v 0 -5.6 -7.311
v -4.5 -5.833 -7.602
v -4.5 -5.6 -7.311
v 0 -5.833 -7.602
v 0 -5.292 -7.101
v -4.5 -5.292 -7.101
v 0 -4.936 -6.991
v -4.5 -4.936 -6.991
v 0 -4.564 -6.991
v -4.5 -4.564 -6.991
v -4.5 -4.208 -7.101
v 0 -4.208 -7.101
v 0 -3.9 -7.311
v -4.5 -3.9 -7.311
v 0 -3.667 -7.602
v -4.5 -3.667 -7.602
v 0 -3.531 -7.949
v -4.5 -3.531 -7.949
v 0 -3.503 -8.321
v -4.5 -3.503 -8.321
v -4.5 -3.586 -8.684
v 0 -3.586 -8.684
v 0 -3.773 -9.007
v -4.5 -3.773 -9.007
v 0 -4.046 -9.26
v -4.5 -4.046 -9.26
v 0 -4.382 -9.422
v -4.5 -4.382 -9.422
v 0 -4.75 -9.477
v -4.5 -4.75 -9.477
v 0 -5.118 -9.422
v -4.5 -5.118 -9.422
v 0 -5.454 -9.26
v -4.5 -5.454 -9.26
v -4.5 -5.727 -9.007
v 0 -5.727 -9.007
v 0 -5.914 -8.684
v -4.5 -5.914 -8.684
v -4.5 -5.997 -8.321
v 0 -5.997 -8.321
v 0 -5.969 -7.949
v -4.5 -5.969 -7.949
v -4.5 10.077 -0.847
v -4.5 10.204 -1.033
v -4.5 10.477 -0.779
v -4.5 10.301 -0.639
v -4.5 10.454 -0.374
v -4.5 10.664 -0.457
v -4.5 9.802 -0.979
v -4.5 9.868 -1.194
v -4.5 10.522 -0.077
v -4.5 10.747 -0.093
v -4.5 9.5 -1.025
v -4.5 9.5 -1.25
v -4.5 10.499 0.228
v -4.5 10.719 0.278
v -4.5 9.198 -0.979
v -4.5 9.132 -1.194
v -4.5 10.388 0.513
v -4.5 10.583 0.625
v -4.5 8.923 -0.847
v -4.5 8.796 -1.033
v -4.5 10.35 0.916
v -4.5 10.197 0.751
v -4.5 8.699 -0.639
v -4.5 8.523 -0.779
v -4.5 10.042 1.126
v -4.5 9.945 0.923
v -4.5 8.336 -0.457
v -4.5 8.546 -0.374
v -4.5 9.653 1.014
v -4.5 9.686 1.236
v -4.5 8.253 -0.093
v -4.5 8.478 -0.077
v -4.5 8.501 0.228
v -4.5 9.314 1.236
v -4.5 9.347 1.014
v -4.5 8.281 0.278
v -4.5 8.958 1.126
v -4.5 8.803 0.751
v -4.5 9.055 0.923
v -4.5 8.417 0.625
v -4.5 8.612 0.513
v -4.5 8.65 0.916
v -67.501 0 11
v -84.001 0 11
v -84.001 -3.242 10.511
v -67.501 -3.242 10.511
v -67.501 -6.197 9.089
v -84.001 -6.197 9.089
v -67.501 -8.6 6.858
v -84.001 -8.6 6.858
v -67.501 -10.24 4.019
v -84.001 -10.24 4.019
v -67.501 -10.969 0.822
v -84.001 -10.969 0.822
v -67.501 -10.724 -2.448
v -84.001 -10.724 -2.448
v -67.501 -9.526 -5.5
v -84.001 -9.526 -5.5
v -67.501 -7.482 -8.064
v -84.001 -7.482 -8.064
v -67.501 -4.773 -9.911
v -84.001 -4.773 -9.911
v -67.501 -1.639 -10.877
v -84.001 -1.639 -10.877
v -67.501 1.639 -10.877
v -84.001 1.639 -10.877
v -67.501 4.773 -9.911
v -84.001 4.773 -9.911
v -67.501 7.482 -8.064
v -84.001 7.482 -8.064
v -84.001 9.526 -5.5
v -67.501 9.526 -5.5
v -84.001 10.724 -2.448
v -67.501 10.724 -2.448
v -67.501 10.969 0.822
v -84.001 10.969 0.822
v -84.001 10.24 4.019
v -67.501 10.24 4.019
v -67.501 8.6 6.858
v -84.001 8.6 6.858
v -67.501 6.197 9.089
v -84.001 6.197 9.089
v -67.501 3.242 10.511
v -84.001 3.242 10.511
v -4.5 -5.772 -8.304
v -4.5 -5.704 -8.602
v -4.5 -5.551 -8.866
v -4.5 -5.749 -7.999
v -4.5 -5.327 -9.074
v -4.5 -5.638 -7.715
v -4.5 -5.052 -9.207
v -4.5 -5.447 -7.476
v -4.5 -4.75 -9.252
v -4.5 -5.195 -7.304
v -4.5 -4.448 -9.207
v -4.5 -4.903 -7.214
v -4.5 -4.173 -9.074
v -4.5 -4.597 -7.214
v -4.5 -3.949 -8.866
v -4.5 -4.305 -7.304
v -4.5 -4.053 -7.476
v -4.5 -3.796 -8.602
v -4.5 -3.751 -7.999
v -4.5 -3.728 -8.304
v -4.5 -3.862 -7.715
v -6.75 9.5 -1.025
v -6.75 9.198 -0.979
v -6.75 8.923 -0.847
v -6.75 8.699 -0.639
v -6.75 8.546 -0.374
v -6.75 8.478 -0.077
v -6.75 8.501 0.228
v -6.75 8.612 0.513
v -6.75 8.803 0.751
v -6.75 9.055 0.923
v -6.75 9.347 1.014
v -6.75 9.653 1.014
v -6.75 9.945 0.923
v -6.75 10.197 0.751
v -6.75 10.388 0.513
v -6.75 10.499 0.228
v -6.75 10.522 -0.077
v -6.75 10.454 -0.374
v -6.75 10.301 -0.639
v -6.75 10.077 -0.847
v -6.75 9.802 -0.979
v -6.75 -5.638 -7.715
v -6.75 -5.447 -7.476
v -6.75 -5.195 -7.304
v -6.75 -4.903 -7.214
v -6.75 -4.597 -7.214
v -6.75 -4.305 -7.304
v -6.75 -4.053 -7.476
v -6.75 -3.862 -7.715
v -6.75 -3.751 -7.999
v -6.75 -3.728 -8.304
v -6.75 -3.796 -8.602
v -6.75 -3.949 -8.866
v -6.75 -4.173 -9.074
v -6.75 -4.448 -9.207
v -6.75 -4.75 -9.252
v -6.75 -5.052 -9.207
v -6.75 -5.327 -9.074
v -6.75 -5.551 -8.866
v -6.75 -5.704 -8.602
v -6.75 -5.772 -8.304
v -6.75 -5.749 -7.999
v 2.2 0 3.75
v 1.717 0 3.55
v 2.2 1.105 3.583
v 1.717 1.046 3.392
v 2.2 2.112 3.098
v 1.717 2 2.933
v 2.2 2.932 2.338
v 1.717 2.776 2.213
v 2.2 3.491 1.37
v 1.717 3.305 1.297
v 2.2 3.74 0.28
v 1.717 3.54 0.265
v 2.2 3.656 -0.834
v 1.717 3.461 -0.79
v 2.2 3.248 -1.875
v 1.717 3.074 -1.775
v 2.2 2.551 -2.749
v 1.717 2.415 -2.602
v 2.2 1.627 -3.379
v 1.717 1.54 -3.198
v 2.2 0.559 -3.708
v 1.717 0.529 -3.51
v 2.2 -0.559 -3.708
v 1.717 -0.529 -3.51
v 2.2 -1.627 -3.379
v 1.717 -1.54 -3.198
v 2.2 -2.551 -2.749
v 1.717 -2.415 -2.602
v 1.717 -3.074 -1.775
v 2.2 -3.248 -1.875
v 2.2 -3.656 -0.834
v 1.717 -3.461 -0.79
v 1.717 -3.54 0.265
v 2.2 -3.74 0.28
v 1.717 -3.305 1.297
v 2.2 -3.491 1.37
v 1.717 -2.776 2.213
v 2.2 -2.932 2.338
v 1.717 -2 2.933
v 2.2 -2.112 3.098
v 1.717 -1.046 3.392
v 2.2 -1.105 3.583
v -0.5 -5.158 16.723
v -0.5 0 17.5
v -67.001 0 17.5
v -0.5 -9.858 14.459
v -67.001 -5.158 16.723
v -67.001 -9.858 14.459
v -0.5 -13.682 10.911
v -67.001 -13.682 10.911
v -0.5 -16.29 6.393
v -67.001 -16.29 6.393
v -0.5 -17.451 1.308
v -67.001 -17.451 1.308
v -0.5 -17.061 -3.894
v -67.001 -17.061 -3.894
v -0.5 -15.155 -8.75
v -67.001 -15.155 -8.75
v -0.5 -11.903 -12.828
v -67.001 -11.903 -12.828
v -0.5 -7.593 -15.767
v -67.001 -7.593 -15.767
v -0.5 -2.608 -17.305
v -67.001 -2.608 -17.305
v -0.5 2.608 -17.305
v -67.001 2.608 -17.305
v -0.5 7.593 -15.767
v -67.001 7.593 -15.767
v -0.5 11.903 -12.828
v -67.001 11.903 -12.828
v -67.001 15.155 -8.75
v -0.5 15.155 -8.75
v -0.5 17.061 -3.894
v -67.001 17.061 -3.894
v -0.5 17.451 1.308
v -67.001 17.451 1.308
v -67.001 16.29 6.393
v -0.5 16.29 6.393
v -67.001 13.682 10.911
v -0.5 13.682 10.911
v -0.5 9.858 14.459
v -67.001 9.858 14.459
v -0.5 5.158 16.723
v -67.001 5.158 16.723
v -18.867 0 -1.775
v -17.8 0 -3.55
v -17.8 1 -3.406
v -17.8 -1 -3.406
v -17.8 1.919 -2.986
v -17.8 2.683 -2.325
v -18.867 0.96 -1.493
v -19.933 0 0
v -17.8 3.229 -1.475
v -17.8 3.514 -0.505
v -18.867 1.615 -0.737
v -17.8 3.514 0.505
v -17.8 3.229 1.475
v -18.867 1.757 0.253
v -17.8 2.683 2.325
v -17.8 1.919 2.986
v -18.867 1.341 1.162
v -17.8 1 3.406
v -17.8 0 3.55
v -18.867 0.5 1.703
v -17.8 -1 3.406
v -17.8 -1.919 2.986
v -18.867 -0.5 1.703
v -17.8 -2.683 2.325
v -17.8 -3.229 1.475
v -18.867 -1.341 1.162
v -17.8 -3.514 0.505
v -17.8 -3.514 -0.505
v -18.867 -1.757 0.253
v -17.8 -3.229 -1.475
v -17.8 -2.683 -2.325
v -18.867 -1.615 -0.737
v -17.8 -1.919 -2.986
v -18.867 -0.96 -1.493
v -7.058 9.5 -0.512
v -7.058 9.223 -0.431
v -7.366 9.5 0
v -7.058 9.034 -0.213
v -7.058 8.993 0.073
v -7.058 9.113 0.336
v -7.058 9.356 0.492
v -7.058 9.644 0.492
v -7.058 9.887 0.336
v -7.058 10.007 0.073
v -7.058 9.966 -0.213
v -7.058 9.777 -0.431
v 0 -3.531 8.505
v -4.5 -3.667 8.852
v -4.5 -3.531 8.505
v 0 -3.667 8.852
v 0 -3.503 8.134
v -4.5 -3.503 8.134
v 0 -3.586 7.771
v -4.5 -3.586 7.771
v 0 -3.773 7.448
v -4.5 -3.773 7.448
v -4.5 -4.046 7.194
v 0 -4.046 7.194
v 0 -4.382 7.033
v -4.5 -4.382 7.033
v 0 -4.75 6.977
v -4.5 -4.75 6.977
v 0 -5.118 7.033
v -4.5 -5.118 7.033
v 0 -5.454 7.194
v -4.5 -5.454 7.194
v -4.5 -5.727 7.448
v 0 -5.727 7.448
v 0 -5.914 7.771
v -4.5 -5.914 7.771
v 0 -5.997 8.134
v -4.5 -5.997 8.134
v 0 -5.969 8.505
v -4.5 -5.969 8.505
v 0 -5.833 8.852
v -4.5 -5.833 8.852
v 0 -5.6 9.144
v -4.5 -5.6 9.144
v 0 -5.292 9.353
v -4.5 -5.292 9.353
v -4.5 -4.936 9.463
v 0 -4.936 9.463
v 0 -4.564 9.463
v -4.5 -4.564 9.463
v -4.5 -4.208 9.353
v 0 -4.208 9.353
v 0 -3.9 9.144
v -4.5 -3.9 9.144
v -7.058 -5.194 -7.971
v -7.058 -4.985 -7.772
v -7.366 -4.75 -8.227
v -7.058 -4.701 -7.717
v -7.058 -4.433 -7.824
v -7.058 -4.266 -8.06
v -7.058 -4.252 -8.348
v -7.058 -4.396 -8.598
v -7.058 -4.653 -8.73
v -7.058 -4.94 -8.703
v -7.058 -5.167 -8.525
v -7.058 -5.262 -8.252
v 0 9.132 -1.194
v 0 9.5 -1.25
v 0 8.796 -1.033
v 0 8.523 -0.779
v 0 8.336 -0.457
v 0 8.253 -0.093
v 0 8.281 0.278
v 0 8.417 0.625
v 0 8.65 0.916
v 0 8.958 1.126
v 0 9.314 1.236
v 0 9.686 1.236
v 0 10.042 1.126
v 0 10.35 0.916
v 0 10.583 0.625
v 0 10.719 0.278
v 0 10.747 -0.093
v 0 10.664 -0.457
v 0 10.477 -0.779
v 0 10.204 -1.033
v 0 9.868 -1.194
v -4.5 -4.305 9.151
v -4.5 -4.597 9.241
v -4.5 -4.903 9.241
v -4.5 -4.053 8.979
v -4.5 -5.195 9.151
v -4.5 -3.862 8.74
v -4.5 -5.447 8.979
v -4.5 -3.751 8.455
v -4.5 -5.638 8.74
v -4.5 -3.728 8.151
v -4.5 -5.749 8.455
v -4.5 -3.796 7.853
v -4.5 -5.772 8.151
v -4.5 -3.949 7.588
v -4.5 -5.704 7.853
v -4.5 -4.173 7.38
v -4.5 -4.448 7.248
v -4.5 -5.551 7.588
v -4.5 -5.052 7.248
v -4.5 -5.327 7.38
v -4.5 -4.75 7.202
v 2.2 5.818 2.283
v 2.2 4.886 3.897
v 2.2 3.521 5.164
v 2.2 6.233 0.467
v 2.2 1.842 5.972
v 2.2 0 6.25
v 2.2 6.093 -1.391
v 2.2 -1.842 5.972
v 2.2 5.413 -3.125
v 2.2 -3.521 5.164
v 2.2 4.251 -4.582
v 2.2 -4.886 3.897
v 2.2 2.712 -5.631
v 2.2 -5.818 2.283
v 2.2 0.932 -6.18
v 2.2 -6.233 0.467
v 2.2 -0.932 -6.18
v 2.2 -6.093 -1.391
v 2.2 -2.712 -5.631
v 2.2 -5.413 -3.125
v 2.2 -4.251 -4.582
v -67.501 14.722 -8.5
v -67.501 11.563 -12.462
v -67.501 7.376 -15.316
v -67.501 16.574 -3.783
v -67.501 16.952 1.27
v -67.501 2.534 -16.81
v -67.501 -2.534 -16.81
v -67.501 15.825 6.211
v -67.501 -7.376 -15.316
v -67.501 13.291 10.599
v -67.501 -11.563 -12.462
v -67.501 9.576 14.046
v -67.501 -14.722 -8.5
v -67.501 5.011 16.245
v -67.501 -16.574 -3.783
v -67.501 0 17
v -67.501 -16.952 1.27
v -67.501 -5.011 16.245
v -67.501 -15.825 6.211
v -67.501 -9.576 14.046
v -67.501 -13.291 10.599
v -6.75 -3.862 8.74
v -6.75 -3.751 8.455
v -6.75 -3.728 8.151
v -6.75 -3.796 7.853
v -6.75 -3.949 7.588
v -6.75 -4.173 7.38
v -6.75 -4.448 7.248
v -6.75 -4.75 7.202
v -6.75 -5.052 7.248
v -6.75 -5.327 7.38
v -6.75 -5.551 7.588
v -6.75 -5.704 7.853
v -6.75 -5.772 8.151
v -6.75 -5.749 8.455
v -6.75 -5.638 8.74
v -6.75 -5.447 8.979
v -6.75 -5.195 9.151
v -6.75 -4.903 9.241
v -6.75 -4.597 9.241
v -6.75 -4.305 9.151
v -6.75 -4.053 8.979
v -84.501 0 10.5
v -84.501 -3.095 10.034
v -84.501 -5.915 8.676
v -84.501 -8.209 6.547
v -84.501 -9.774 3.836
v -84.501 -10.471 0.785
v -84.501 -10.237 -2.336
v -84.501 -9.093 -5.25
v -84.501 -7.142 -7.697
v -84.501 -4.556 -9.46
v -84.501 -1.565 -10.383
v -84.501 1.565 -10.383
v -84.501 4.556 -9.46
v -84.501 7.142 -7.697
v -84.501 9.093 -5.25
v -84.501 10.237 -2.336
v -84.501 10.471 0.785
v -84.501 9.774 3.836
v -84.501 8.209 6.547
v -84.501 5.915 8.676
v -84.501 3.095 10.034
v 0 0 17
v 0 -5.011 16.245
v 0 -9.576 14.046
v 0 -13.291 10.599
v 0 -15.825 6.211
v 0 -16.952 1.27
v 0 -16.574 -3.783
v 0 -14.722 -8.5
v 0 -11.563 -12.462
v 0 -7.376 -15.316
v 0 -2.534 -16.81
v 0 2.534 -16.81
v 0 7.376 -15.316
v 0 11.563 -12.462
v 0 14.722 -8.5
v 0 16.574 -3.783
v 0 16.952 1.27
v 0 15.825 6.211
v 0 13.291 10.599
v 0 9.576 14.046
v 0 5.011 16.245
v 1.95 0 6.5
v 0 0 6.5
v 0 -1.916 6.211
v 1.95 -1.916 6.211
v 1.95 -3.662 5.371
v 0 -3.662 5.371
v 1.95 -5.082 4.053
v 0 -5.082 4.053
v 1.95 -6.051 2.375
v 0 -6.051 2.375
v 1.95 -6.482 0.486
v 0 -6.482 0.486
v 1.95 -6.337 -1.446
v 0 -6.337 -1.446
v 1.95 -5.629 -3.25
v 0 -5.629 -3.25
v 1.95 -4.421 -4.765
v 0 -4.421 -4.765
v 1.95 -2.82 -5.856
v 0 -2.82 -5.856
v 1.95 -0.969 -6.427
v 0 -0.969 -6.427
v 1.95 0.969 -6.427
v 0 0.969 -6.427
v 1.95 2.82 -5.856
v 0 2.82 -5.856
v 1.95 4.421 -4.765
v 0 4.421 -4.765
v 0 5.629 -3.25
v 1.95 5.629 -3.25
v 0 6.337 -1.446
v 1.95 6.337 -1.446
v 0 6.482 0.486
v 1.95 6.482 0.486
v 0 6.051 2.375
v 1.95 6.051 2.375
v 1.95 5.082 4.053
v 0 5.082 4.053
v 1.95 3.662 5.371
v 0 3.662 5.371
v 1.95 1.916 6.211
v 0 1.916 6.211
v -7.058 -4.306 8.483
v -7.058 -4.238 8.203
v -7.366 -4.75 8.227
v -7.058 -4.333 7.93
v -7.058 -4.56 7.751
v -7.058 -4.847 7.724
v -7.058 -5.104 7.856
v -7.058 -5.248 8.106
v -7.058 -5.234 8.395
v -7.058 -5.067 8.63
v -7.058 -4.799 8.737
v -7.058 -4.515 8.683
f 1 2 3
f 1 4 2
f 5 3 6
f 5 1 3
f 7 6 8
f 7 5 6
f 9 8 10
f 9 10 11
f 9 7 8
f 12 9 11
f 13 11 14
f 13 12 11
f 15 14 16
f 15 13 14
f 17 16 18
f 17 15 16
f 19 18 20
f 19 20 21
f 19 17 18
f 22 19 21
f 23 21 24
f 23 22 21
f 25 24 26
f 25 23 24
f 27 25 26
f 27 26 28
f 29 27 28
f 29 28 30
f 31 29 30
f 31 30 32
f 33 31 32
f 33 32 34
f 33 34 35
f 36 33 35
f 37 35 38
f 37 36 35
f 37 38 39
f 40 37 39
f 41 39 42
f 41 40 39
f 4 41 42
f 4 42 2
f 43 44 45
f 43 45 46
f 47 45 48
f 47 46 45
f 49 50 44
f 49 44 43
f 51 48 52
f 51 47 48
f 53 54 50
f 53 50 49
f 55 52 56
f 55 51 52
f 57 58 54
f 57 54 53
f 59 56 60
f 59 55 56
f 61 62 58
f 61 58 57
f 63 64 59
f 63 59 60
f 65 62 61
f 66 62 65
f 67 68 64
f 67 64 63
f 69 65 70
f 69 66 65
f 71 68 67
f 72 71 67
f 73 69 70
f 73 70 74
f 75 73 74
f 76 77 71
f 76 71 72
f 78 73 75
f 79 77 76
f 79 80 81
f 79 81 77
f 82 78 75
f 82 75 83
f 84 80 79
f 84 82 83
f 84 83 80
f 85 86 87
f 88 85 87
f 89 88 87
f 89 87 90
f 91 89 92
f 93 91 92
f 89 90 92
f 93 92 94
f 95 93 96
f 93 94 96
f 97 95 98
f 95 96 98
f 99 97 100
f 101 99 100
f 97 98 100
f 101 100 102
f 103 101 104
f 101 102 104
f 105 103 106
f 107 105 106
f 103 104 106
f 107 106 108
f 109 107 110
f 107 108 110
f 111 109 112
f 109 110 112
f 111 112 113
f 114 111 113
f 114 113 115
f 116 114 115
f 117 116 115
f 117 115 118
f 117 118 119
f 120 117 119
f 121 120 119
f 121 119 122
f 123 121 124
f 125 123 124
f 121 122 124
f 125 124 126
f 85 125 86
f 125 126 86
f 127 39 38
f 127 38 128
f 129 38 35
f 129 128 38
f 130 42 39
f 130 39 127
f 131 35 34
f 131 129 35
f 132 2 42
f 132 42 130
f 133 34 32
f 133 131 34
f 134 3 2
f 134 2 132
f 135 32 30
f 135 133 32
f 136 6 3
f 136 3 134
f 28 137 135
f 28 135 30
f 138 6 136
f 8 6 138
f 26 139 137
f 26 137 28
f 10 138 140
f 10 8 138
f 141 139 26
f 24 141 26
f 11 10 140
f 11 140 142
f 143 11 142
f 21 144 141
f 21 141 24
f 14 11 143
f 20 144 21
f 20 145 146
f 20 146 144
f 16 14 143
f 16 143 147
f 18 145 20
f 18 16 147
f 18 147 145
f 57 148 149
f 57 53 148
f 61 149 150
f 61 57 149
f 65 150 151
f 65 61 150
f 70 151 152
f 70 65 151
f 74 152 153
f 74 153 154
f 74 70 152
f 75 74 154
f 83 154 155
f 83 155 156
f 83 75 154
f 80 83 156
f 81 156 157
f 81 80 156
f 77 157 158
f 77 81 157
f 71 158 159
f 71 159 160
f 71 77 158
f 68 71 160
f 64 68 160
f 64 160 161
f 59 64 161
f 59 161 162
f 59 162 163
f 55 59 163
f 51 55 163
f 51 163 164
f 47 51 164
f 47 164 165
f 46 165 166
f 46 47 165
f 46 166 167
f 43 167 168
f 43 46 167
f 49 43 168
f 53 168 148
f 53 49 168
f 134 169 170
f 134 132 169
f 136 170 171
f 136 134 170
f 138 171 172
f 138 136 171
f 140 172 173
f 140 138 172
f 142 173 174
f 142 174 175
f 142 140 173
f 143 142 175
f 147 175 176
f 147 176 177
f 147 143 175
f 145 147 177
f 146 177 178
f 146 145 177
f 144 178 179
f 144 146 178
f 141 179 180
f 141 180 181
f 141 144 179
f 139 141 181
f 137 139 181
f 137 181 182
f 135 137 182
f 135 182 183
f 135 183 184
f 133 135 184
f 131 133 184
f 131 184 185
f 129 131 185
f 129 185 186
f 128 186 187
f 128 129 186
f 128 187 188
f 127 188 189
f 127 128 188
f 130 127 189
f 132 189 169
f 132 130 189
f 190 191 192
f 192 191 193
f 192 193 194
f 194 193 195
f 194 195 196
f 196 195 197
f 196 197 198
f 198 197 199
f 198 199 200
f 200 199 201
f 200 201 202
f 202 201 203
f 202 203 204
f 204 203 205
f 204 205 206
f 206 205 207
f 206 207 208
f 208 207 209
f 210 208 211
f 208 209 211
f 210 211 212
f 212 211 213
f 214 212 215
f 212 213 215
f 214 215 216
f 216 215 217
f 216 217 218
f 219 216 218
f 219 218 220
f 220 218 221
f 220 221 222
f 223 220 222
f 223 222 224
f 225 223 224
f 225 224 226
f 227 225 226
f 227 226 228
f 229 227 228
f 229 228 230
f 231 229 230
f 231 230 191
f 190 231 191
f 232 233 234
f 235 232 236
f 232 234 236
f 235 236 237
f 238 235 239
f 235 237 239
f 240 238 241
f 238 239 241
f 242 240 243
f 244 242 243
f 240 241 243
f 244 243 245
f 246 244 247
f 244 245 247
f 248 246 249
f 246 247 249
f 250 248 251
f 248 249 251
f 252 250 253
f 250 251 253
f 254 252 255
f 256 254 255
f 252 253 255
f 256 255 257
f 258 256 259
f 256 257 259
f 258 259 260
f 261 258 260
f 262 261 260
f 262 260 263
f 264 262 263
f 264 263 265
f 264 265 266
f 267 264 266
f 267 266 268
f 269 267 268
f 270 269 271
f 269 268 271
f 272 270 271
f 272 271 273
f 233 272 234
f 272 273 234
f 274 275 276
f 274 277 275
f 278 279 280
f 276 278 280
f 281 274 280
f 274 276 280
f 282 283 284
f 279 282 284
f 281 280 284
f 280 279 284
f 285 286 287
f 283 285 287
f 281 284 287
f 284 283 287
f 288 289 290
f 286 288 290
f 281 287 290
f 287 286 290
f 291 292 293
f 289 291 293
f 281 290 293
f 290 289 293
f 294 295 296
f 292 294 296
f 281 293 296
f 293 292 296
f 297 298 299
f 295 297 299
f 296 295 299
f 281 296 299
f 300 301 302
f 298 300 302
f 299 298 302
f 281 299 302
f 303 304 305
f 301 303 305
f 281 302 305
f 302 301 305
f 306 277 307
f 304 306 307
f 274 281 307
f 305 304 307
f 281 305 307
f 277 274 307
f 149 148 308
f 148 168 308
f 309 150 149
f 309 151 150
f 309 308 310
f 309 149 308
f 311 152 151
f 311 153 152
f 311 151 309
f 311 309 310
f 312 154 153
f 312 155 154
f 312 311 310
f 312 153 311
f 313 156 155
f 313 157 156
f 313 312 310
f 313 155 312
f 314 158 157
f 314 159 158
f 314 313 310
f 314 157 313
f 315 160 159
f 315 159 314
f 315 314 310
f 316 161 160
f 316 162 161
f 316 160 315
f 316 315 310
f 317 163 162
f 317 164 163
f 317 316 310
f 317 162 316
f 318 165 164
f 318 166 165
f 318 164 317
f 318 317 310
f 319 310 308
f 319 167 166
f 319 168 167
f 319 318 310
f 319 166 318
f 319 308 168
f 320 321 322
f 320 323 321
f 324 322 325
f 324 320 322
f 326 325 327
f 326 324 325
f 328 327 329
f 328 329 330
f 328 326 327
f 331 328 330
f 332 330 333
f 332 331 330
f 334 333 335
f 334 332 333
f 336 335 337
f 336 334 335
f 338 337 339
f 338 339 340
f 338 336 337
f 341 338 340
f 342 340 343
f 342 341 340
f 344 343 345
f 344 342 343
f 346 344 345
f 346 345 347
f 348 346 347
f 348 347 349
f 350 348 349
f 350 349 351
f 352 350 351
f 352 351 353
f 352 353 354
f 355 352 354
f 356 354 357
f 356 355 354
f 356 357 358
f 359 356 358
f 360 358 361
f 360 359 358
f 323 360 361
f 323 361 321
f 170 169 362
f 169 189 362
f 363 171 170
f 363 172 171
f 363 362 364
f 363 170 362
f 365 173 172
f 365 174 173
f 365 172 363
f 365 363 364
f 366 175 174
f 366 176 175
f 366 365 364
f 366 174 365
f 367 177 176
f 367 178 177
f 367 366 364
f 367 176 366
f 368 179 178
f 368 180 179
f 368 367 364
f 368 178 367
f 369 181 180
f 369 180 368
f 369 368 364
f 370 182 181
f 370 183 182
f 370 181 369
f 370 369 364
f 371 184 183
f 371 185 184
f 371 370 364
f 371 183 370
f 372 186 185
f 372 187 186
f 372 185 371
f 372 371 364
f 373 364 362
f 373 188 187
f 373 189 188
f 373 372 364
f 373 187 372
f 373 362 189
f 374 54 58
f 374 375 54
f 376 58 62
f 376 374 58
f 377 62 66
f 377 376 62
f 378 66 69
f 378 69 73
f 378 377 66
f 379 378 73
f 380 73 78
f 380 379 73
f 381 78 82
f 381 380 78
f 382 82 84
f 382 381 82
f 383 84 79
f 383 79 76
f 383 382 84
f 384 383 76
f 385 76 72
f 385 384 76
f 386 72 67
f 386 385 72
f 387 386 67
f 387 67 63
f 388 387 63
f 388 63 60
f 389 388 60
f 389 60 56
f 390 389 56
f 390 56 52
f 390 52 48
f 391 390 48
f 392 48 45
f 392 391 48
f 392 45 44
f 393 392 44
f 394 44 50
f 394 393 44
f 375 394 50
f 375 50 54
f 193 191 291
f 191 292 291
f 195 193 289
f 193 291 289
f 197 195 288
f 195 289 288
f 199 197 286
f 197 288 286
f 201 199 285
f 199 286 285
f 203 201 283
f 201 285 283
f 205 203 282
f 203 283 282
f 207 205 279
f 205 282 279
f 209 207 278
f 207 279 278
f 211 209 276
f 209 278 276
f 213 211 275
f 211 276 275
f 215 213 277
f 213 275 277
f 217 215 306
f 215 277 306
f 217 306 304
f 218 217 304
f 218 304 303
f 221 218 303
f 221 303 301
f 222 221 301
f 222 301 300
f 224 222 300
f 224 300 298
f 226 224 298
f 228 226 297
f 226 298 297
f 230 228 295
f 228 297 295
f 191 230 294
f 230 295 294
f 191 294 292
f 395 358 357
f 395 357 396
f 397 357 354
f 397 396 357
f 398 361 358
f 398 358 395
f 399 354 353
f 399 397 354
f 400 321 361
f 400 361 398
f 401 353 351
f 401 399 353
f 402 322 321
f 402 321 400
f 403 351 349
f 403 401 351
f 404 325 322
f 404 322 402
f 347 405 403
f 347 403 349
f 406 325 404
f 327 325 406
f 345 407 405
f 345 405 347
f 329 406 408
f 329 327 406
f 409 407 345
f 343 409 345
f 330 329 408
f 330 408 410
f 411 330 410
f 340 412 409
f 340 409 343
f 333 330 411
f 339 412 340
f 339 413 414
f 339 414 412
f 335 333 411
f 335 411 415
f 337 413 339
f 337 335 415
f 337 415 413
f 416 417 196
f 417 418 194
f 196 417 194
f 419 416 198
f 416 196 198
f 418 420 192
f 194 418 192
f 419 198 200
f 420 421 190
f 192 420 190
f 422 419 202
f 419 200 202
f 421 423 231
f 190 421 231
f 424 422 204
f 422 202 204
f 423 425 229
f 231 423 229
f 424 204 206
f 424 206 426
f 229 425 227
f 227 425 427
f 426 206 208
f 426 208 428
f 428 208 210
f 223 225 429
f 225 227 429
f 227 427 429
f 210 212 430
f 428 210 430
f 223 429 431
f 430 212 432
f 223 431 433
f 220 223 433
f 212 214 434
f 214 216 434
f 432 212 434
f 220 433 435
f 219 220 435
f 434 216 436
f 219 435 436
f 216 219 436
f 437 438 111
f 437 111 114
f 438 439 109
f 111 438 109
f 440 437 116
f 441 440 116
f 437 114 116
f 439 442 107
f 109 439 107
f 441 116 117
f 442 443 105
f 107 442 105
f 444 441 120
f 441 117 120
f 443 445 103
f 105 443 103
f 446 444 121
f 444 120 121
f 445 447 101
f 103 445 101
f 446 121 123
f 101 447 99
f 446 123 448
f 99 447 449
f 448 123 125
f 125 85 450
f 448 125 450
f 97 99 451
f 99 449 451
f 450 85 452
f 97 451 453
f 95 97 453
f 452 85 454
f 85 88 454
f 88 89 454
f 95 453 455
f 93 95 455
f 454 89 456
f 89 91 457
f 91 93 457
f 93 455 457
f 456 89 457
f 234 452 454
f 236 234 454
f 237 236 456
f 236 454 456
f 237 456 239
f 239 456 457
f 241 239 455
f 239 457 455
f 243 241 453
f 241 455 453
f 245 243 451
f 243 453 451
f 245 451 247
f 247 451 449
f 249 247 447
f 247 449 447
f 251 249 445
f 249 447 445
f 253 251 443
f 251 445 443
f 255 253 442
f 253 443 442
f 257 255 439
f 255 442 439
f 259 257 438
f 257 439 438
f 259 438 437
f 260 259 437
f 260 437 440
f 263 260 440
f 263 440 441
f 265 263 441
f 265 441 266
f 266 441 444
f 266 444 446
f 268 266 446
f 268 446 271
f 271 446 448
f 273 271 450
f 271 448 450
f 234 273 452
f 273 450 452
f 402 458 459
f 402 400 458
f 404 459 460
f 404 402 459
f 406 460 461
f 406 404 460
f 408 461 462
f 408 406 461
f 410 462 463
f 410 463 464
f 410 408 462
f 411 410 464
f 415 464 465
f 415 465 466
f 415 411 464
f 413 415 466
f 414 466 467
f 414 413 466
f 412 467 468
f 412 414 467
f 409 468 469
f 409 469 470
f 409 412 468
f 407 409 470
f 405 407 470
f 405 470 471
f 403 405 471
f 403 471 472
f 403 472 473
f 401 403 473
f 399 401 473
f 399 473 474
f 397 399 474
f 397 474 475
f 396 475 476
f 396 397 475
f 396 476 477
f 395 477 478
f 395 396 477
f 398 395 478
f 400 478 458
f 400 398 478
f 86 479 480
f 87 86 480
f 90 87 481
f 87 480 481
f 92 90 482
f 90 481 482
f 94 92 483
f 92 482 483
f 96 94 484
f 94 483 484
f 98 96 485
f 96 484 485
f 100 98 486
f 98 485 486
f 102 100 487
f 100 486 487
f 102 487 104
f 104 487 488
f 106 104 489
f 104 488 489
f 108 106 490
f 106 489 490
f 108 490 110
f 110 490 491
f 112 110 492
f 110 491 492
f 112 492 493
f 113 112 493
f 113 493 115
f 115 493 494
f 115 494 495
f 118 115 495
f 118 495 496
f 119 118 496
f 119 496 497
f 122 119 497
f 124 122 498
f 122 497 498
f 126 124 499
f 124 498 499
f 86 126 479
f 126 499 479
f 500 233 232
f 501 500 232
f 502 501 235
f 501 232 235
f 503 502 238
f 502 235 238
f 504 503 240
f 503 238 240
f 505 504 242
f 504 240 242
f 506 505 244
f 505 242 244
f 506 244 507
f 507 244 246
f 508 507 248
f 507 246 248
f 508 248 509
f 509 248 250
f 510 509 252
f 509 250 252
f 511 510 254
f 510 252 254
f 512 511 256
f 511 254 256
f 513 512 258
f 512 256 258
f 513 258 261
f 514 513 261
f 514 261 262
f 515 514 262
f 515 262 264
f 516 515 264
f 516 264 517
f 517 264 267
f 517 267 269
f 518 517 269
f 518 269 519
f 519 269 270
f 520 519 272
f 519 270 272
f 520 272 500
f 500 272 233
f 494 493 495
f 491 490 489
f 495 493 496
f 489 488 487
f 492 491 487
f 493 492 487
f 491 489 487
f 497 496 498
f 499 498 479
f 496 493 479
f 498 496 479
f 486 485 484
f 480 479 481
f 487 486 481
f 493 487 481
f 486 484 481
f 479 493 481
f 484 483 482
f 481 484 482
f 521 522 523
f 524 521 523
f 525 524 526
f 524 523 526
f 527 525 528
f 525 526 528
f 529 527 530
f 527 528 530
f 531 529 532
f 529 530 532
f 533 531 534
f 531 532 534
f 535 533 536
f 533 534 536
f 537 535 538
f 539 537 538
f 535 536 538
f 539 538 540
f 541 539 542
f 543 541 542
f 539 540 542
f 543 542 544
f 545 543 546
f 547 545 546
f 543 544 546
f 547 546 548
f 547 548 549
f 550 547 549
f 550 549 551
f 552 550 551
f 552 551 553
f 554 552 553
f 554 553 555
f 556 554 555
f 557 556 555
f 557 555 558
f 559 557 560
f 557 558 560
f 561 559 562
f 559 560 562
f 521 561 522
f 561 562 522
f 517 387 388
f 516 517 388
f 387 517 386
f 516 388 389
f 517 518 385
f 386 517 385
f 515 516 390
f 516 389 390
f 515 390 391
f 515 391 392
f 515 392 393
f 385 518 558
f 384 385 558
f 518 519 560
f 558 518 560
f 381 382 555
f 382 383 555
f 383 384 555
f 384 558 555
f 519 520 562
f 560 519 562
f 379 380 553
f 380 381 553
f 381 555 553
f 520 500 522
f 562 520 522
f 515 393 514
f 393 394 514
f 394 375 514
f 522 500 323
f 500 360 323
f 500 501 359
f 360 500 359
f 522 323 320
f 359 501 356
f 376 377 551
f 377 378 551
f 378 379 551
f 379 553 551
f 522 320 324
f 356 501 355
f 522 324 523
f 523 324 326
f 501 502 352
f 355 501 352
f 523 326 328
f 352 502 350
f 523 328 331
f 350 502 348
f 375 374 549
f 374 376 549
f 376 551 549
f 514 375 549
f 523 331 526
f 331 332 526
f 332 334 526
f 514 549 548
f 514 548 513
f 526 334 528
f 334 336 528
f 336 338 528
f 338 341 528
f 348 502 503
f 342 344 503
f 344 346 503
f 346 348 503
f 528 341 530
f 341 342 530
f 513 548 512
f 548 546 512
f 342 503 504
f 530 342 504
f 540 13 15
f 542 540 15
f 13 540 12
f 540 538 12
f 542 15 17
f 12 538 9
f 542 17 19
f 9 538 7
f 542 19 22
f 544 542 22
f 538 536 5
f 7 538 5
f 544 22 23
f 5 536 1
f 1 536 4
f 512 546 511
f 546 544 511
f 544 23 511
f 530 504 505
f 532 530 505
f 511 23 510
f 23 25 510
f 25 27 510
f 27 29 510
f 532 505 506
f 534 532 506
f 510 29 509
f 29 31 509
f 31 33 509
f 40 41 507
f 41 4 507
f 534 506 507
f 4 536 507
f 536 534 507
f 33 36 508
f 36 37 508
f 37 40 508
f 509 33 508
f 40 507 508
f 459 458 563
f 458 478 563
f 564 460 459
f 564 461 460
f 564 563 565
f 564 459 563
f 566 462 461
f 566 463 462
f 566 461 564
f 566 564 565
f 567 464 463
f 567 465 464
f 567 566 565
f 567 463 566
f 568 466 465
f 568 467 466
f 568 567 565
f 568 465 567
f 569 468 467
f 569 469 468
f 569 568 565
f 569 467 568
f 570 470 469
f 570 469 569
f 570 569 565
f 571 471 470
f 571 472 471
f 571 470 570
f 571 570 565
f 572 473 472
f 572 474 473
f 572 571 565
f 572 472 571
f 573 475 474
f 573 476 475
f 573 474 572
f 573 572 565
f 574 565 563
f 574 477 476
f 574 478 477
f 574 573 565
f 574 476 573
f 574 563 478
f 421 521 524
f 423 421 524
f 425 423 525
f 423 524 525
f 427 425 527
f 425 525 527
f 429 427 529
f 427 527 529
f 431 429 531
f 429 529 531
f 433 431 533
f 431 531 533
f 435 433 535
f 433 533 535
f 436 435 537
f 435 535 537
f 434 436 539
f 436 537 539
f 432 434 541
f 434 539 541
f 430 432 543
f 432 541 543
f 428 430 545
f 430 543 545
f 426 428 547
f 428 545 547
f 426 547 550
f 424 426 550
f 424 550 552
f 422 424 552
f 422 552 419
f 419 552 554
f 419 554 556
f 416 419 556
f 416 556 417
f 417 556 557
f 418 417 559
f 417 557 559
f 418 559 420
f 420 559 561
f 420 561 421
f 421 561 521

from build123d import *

# Parameters (mm, degrees)
CHANFREIN2_SIZE                   = 0.25
R_P_TITION_CIRCULAIRE1_COUNT      = 3
CHANFREIN3_SIZE                   = 0.5
D_GAGEMENT_POUR_M6_51_D           = 7.1
D_GAGEMENT_POUR_M6_51_DEPTH       = 20
D_GAGEMENT_POUR_M6_51_CSINK_D     = 7.5
D_GAGEMENT_POUR_M6_51_CSINK_ANGLE = 45
D_GAGEMENT_POUR_M6_51_TIP         = 2.133055198


with BuildPart() as part:
    # Esquisse1 → Base-Révolution (revolve)
    with BuildSketch(Plane.XY):
        Polygon((2.2, 0), (2.2, 6.5), (0, 6.5), (0, 17.5), (-67.500713504, 17.5), (-67.500713504, 11), (-84.500713504, 11), (-84.500713504, 0), align=None)
    revolve(axis=Axis((-71.12515213, 0, 0), (1, 0, 0)))

    # Chanfrein2
    chanfrein2_edges = [part.edges().sort_by_distance(p)[0] for p in [
        (2.2, -6.5, 0),
    ]]
    chamfer(chanfrein2_edges, length=CHANFREIN2_SIZE)

    # Esquisse2 → Trou taraudé M2.5x0.451 (revolve, cut)
    with BuildSketch(Plane(origin=(0, 9.5, 0), x_dir=(0, 0, -1), z_dir=(0, 1, 0))):
        Polygon((0, 0), (0, 7.365882135), (1.025, 6.75), (1.025, 4.5), (1.25, 4.5), (1.25, 0), align=None)
    trou_taraud_m2_5x0_451 = revolve(axis=Axis((6.35, 9.5, 0), (-1, 0, 0)), mode=Mode.SUBTRACT)

    # Répétition circulaire1: Trou taraudé M2.5x0.451 ×3 about axis
    r_p_tition_circulaire1_axis = Axis((-21.12515213, 0, 0), (-1, 0, 0))
    for i in range(1, R_P_TITION_CIRCULAIRE1_COUNT):
        add(trou_taraud_m2_5x0_451.rotate(r_p_tition_circulaire1_axis, i * 360 / R_P_TITION_CIRCULAIRE1_COUNT), mode=Mode.SUBTRACT)

    # Chanfrein3
    chanfrein3_edges = [part.edges().sort_by_distance(p)[0] for p in [
        (-84.500713504, -11, 0),
        (-67.500713504, -17.5, 0),
        (0, -17.5, 0),
    ]]
    chamfer(chanfrein3_edges, length=CHANFREIN3_SIZE)

    # Dégagement pour M6.51
    with Locations(Plane(origin=(2.2, 0, 0), x_dir=(0, 0, -1), z_dir=(1, 0, 0))):
        with Locations((0, 0)):
            CounterSinkHole(D_GAGEMENT_POUR_M6_51_D / 2, D_GAGEMENT_POUR_M6_51_CSINK_D / 2, depth=D_GAGEMENT_POUR_M6_51_DEPTH, counter_sink_angle=D_GAGEMENT_POUR_M6_51_CSINK_ANGLE)
            with Locations((0, 0, -(D_GAGEMENT_POUR_M6_51_DEPTH + D_GAGEMENT_POUR_M6_51_TIP / 2))):  # 118° drill point
                Cone(0, D_GAGEMENT_POUR_M6_51_D / 2, D_GAGEMENT_POUR_M6_51_TIP, mode=Mode.SUBTRACT)


solid = part.part
